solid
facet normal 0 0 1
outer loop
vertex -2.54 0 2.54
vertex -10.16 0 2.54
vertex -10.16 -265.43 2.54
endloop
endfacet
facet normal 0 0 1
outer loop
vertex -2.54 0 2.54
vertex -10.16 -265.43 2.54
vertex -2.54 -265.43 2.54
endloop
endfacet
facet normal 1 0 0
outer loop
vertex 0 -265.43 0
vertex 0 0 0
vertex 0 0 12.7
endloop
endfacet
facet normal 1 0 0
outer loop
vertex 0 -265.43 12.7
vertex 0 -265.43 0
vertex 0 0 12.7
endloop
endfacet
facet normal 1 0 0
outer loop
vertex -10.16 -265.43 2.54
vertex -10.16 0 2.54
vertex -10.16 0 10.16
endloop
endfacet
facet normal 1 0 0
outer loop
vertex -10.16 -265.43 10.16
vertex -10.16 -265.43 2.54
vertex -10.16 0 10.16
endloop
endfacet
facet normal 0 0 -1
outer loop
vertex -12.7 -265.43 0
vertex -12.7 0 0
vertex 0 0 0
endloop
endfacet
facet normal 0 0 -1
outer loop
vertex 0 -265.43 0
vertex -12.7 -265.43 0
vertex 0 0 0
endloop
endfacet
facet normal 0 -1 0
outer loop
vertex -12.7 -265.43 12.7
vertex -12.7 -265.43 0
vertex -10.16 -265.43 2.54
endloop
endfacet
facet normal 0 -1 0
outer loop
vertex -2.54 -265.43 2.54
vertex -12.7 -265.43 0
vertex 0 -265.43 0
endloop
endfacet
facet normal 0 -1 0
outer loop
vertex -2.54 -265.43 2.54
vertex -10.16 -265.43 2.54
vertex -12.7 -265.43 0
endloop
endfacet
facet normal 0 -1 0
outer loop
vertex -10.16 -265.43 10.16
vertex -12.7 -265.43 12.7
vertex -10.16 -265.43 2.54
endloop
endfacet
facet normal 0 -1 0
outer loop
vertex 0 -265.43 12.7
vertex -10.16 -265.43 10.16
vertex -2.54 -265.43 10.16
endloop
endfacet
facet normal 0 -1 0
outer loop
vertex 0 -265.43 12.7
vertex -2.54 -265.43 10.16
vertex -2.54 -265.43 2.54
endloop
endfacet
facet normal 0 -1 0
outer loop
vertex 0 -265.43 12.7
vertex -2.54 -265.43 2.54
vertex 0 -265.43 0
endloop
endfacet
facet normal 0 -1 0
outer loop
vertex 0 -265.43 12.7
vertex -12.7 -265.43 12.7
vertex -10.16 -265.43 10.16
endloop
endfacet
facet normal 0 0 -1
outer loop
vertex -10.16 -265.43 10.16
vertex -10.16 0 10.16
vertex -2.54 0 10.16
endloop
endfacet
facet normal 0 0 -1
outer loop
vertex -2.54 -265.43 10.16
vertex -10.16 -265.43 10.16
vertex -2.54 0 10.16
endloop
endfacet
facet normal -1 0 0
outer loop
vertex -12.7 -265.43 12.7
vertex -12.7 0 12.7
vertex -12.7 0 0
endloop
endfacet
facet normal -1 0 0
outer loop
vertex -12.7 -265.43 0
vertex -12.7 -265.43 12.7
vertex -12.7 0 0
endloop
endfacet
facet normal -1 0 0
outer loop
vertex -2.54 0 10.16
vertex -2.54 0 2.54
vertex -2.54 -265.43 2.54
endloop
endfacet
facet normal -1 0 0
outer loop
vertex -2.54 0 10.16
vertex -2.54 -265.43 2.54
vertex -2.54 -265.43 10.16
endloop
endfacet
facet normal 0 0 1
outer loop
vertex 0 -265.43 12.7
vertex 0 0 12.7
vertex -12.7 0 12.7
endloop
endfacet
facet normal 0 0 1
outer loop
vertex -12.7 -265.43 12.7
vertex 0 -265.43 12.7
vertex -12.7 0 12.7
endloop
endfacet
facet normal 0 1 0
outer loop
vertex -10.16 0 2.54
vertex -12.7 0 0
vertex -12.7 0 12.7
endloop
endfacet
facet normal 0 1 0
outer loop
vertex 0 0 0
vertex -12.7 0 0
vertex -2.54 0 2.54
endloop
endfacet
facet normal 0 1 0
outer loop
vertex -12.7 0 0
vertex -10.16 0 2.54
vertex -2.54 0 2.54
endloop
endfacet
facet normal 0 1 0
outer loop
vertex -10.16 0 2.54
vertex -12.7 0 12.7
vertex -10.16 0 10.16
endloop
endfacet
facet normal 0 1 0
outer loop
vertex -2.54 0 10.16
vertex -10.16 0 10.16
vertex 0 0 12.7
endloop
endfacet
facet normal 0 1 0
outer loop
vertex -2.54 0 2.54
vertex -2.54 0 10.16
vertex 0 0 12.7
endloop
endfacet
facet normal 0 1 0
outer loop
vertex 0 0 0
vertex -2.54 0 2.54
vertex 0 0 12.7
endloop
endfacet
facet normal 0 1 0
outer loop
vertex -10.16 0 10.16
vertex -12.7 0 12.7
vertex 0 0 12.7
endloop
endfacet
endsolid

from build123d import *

# Parameters (mm, degrees)
F0_W     = 7.62
F0_H     = 7.62
F1_DEPTH = 265.43


with BuildPart() as f1:
    # F0 (on Front) → F1 (new body)
    with BuildSketch(Plane.XZ):
        Polygon((-12.7, 0), (0, 0), (0, 12.7), (-10.16, 12.7), (-12.7, 12.7), align=None)
        with Locations((-6.35, 6.35)):
            Rectangle(F0_W, F0_H, mode=Mode.SUBTRACT)
    extrude(amount=F1_DEPTH)


solid = f1.part
